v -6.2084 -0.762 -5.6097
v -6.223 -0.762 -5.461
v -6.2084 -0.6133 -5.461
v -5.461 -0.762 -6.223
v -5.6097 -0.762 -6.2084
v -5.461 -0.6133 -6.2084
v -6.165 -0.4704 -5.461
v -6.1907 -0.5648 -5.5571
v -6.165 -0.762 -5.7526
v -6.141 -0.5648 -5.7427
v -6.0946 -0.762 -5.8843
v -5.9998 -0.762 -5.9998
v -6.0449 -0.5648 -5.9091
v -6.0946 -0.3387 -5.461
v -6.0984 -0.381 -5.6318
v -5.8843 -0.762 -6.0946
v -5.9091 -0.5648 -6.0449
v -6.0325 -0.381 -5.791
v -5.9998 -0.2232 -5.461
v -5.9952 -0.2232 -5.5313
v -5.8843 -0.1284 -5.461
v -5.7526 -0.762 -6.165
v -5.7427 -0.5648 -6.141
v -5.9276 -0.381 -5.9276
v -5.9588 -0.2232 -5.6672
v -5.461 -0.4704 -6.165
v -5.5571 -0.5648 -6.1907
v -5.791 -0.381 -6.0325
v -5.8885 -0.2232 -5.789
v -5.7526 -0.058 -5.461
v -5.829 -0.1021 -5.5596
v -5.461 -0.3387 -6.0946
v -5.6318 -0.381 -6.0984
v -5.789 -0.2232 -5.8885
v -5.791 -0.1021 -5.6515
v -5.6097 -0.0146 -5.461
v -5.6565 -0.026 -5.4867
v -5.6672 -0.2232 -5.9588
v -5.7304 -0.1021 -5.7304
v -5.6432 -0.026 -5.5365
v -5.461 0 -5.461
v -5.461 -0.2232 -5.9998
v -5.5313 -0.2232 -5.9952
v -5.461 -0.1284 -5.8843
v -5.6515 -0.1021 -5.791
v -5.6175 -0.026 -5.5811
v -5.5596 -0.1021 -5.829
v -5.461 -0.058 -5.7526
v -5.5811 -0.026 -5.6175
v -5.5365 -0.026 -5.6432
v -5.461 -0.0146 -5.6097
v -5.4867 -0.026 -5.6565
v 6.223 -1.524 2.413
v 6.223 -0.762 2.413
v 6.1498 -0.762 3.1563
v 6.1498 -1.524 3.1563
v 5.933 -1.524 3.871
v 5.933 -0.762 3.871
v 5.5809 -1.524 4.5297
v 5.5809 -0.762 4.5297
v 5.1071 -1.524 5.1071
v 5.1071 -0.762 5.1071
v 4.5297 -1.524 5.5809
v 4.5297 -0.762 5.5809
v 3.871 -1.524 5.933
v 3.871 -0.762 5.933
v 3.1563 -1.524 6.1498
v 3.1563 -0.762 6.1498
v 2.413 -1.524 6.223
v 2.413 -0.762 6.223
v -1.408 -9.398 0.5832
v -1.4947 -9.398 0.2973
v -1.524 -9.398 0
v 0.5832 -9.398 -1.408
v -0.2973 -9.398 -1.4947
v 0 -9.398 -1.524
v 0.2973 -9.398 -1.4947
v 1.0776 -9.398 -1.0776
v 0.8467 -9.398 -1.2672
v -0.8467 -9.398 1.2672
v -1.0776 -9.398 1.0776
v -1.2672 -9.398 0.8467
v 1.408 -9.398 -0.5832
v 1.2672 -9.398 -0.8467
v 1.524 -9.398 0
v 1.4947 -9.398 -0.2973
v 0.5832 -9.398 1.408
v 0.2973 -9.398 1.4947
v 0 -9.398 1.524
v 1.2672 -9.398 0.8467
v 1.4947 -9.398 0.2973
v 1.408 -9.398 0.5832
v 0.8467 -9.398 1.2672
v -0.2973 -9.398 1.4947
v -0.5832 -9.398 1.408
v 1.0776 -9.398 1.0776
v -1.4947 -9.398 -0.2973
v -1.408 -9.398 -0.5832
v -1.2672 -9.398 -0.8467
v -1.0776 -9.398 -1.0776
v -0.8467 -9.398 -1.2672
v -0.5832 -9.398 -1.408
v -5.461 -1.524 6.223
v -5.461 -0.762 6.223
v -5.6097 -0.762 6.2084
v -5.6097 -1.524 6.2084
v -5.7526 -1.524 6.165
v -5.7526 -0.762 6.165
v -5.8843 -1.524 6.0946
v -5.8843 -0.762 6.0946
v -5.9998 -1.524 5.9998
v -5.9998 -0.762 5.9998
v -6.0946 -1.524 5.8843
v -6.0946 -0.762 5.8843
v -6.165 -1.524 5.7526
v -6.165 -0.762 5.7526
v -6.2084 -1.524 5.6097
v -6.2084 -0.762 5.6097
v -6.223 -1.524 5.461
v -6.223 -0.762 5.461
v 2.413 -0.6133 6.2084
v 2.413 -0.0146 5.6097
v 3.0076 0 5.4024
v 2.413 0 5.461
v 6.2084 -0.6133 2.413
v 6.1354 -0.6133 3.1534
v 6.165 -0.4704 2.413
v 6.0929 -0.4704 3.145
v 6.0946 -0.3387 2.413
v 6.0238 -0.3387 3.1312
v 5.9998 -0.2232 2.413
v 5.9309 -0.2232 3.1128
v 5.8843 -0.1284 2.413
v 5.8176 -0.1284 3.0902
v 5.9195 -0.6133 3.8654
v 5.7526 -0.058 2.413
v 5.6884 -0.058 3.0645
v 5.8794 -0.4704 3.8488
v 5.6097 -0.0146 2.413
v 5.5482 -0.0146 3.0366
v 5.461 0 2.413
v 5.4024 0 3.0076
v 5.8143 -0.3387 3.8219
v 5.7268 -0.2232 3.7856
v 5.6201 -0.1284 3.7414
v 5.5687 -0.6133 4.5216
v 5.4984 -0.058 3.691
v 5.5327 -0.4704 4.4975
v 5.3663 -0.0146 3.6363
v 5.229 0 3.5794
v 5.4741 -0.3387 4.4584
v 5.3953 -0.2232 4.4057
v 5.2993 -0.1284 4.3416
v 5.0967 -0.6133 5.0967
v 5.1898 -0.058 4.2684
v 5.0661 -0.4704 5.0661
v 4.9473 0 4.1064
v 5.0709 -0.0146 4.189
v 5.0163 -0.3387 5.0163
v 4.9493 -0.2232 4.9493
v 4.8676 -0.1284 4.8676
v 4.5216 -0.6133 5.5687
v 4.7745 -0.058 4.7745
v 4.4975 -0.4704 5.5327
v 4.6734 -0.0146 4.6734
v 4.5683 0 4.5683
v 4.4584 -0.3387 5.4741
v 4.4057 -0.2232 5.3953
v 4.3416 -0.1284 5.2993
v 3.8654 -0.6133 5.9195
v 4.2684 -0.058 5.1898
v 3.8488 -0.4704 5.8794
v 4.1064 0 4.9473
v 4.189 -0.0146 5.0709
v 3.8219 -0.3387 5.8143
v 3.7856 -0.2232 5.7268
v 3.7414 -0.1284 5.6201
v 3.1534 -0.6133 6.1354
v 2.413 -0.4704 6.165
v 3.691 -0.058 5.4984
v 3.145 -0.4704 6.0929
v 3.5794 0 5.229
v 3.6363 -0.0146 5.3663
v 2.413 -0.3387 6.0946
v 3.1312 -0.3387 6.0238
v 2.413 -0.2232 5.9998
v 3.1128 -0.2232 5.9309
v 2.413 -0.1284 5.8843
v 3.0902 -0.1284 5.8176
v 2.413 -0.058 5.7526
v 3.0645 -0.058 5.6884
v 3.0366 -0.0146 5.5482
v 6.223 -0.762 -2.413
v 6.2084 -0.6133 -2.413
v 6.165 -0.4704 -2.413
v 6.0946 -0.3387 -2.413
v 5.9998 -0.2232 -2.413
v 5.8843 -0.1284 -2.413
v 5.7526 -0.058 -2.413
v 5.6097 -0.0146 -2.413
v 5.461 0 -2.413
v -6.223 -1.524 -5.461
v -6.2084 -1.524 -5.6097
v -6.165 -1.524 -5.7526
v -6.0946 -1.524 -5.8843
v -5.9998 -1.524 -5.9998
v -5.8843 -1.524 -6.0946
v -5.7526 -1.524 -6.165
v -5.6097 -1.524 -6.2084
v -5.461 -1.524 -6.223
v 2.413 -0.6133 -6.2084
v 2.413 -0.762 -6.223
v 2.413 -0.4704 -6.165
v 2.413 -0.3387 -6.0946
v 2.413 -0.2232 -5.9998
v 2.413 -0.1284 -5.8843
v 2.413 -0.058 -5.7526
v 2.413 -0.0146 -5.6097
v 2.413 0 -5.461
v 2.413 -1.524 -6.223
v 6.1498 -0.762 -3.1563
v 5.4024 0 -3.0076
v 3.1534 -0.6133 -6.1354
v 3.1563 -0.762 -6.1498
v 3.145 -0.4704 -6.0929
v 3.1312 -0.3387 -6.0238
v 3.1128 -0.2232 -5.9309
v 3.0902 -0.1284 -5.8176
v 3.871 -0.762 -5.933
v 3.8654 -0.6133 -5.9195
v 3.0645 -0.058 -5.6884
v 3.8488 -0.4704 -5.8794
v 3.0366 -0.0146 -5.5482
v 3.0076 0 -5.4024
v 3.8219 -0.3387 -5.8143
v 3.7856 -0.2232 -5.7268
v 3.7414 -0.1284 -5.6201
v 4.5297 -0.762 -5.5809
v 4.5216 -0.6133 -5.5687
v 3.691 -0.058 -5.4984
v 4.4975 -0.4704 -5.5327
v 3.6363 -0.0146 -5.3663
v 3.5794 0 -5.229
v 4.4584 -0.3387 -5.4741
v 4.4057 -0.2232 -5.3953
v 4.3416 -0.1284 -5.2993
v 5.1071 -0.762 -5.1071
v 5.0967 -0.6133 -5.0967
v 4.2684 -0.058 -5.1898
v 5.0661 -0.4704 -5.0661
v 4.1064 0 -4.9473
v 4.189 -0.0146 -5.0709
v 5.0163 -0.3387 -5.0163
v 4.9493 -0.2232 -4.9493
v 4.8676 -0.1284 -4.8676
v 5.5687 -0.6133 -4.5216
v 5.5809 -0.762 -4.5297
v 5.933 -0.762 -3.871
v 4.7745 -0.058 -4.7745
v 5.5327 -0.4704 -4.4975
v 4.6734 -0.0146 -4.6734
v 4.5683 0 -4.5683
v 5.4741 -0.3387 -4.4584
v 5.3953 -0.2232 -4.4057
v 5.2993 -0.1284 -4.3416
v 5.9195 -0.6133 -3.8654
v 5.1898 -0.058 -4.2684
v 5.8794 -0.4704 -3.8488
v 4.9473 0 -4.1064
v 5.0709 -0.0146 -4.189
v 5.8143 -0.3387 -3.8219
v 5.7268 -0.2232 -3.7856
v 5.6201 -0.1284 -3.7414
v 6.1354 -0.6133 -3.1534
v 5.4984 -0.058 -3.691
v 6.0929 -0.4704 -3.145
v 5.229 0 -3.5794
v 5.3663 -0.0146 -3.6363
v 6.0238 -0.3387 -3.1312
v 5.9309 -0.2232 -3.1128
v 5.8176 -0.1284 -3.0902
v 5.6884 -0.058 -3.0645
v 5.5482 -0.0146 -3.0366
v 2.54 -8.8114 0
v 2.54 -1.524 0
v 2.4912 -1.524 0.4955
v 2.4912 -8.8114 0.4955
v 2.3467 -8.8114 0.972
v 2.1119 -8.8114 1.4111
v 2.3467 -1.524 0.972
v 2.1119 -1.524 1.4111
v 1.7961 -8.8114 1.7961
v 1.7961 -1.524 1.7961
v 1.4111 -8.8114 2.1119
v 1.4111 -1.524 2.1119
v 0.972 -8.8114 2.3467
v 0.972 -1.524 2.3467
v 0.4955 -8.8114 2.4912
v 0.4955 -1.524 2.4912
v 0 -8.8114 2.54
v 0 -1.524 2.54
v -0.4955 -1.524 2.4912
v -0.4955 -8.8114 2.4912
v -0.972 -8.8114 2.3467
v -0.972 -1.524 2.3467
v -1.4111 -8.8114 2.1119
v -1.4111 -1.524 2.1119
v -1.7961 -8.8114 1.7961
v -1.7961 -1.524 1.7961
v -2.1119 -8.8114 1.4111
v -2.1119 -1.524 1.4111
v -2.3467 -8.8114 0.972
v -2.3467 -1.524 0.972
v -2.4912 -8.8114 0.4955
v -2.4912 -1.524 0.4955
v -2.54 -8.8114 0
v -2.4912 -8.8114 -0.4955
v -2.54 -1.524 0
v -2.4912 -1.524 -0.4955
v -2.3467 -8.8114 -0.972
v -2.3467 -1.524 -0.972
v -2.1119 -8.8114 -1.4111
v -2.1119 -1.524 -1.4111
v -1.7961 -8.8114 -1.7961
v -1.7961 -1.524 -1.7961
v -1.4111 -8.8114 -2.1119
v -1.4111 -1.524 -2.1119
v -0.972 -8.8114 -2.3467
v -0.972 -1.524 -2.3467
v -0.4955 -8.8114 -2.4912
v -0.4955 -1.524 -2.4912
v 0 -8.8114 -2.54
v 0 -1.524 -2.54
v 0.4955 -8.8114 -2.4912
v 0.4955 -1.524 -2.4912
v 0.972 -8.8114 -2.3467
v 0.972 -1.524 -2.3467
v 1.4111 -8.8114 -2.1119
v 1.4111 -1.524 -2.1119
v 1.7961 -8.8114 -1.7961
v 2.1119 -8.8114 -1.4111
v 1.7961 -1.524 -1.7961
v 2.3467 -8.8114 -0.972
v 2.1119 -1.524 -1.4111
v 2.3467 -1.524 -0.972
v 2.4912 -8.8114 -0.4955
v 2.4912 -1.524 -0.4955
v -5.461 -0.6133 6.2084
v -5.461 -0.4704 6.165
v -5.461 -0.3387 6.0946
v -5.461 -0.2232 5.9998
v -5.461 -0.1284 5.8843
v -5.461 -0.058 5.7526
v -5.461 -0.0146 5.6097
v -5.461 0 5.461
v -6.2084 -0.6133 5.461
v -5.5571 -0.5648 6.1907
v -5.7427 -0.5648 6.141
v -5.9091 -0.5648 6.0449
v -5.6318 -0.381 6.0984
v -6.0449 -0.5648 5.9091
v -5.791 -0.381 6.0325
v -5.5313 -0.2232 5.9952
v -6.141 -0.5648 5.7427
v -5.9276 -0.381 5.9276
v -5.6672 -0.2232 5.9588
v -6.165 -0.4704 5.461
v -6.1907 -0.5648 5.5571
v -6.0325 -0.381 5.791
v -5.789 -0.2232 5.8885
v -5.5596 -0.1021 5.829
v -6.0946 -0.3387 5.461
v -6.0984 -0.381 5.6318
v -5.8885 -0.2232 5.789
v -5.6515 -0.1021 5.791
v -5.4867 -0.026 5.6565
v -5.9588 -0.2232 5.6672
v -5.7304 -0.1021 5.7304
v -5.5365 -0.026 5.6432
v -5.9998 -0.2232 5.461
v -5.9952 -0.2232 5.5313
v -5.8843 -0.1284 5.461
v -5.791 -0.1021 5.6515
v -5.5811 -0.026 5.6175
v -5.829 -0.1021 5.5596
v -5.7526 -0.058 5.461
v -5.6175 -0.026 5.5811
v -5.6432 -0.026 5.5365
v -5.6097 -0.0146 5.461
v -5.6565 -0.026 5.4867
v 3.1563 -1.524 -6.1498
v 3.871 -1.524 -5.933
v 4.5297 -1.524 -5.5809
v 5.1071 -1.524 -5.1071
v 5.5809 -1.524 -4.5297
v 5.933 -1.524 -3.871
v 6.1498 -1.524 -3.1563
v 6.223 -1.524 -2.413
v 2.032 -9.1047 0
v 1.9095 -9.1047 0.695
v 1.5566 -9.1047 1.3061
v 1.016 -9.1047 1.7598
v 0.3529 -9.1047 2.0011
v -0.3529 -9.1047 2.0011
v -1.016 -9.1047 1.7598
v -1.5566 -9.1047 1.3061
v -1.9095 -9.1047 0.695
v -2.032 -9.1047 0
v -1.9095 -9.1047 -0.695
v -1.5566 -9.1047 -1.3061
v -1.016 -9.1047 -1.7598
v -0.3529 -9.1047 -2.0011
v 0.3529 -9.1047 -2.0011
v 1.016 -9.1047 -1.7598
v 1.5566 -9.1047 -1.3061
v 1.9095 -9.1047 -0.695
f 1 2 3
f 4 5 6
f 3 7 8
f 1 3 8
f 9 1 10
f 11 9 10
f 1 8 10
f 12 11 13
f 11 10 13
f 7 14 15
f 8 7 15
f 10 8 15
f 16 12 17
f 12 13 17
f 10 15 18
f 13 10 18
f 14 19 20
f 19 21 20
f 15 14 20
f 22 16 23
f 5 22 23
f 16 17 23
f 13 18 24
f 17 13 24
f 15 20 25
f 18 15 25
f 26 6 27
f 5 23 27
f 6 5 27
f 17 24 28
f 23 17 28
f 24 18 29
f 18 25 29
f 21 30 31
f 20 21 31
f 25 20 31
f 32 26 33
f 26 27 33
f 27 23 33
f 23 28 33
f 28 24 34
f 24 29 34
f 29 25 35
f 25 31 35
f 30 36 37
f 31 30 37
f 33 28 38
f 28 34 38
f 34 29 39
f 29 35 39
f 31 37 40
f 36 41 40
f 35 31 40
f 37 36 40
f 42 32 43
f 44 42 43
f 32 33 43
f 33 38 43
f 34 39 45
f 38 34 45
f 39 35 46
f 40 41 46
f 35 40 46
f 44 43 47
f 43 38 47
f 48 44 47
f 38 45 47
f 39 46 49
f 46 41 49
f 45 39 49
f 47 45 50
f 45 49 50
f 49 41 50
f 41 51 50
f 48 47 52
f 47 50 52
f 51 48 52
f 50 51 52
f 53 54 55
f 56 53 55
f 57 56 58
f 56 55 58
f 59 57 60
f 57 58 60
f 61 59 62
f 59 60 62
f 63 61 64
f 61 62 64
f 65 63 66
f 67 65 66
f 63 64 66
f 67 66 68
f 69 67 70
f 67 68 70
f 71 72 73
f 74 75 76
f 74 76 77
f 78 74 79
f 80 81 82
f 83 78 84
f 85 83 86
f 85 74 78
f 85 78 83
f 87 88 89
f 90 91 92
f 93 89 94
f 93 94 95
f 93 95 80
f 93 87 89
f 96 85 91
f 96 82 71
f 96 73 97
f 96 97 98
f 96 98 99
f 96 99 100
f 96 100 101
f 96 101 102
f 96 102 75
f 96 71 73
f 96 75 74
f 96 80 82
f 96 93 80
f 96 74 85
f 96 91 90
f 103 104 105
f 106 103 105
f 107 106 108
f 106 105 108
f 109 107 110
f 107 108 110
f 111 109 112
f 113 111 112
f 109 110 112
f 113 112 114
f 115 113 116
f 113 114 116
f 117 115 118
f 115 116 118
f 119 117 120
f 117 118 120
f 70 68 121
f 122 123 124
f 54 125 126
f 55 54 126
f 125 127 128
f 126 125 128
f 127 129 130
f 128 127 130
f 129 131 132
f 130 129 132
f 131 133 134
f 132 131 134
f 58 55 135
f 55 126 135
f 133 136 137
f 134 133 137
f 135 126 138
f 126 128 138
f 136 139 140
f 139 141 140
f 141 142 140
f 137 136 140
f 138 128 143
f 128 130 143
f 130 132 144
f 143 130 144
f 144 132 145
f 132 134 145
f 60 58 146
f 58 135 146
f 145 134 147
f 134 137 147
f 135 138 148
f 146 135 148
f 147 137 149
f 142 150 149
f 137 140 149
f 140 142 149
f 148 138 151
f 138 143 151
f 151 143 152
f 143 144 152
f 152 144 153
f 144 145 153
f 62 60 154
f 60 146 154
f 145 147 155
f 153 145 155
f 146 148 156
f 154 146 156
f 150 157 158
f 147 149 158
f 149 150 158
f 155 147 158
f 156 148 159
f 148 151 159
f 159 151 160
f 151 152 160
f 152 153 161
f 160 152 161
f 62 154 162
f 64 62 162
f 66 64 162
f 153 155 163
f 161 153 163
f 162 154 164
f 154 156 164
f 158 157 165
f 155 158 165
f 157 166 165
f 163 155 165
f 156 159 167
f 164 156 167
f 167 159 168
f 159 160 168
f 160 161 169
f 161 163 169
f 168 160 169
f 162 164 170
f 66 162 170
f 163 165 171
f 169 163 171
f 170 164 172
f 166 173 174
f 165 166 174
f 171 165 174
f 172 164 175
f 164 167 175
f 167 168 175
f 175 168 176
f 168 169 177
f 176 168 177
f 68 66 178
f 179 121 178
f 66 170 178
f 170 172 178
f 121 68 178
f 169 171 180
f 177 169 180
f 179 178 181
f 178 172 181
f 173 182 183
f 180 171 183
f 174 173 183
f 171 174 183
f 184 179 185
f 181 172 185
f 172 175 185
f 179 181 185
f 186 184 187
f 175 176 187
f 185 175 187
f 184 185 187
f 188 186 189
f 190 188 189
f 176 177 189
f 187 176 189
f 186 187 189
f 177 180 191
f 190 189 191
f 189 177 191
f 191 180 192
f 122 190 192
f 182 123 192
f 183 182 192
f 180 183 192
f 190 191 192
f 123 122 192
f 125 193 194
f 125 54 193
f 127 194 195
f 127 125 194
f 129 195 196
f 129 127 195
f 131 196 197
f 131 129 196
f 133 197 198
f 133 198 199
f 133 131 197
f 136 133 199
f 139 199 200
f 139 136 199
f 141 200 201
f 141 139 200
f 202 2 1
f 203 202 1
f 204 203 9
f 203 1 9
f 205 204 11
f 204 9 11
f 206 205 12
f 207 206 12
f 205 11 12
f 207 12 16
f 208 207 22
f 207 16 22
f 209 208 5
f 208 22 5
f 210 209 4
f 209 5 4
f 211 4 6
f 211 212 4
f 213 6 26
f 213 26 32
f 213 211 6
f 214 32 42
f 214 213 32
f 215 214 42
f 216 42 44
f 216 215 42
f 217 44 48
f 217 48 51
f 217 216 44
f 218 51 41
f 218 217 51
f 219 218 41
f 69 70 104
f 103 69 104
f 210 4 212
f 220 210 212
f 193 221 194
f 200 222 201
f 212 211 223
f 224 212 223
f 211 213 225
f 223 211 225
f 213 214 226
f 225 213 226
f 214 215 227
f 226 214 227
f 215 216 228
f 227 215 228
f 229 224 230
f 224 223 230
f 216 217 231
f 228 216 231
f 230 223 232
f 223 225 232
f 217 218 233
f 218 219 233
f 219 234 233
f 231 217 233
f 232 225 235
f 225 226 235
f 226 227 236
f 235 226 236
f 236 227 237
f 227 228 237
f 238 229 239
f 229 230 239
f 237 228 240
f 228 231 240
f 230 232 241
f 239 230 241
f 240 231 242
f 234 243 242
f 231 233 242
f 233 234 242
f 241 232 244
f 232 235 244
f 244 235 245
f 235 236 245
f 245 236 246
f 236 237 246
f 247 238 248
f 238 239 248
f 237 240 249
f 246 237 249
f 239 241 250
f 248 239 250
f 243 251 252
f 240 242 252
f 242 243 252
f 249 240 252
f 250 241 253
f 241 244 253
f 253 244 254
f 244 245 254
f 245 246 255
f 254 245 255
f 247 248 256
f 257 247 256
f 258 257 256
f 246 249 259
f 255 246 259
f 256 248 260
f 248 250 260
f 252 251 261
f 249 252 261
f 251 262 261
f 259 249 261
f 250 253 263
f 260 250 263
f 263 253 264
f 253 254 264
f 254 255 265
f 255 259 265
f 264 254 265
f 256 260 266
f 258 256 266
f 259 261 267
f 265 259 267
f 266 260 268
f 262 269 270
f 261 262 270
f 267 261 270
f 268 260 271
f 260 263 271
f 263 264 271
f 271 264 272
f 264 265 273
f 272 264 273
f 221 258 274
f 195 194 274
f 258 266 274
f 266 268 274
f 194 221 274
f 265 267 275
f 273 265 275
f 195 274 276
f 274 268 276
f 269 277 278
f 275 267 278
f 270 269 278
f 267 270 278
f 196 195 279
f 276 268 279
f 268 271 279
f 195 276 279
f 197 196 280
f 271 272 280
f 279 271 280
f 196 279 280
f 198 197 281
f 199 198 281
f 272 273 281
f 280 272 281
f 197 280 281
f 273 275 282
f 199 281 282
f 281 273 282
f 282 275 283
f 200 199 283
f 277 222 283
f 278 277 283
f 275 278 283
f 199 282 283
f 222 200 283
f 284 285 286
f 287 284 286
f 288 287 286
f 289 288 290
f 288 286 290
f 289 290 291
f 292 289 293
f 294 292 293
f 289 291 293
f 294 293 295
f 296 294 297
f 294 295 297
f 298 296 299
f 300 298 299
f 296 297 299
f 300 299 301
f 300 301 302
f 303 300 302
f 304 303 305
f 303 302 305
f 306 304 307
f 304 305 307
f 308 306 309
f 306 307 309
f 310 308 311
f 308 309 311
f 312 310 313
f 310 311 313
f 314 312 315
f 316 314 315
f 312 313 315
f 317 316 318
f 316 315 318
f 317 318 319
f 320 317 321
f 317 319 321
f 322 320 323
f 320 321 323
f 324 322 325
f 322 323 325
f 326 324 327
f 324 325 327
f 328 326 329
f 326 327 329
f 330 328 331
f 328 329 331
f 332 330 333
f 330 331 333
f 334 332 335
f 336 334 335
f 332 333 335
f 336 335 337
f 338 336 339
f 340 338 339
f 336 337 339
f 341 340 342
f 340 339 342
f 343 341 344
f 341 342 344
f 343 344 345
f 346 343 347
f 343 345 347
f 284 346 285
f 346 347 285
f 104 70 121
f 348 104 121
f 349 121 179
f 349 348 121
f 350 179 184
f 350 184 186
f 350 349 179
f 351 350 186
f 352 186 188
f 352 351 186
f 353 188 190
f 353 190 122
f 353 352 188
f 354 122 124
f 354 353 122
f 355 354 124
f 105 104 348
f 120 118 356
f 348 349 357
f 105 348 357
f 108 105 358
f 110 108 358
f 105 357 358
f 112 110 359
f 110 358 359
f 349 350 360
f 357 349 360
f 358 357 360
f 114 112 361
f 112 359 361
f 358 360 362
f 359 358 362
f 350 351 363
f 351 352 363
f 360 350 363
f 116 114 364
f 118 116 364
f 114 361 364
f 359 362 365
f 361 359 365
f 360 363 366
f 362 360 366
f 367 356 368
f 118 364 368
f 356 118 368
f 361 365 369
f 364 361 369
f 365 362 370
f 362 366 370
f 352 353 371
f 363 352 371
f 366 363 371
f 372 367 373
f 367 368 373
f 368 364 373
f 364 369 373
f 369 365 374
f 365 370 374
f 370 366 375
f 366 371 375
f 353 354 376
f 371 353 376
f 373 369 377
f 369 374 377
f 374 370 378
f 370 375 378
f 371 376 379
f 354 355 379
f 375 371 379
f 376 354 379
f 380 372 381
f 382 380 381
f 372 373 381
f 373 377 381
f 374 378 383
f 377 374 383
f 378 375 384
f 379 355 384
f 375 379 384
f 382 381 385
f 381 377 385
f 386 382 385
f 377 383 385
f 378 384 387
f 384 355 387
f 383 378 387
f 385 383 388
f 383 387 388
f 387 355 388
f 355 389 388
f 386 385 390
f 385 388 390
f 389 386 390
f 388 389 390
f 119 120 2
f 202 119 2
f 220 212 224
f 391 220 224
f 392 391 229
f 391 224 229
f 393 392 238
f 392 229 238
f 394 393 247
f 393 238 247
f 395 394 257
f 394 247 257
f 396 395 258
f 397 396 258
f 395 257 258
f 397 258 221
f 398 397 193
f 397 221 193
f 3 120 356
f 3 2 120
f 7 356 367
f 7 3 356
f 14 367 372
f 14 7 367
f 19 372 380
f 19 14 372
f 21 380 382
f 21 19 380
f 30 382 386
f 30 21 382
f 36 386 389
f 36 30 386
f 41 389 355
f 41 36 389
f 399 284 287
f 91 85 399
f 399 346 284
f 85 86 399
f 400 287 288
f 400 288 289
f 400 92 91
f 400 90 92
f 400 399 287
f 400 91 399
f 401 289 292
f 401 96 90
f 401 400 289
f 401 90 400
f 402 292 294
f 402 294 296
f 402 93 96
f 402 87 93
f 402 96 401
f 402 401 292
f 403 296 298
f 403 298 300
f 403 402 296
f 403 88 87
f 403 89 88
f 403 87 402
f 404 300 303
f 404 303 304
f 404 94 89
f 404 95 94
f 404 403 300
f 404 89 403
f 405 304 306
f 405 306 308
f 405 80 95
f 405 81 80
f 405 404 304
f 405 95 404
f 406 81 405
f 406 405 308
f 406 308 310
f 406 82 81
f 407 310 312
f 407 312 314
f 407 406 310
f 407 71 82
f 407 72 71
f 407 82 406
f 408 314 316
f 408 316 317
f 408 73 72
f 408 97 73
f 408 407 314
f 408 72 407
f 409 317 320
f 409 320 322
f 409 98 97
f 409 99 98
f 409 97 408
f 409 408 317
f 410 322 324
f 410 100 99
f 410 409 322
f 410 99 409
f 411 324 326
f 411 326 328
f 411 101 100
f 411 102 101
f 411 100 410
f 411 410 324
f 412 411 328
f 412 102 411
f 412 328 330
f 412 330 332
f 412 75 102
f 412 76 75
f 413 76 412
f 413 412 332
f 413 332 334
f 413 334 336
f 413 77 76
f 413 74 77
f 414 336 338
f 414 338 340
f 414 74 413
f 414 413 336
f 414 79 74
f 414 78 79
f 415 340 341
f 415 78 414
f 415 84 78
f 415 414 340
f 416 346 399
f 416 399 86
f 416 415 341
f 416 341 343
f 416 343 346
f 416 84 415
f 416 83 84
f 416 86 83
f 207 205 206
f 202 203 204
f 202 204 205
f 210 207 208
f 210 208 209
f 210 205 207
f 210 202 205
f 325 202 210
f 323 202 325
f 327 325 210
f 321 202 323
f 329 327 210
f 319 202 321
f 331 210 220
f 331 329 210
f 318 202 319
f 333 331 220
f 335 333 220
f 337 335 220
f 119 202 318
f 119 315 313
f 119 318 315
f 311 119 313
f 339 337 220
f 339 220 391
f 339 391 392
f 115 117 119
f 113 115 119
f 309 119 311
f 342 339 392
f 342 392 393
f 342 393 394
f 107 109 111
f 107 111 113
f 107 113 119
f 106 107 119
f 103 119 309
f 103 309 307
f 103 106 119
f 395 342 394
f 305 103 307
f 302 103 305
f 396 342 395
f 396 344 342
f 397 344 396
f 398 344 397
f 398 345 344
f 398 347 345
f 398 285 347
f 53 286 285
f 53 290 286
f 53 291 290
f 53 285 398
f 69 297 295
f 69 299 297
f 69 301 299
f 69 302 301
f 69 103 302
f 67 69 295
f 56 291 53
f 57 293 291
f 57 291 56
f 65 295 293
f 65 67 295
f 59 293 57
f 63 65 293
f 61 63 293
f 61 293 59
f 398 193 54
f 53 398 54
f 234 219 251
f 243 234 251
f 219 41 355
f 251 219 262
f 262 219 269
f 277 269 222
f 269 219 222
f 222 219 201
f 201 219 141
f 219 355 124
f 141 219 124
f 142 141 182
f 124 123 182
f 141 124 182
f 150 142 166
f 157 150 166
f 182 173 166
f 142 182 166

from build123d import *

# Parameters (mm, degrees)
F1_DEPTH = 1.524
F2_R     = 0.762
F3_R     = 2.54
F4_DEPTH = 7.874
F5_SIZE2 = 1.016
F5_SIZE  = 0.5865878735


with BuildPart() as f1:
    # F0 (on Front) → F1 (new body)
    with BuildSketch(Plane.XZ):
        with BuildLine():
            ThreePointArc((6.223, 2.413), (5.1070768363, 5.1070768363), (2.413, 6.223))
            Line((2.413, 6.223), (-5.461, 6.223))
            ThreePointArc((-5.461, 6.223), (-5.9998153673, 5.9998153673), (-6.223, 5.461))
            Line((-6.223, 5.461), (-6.223, -5.461))
            ThreePointArc((-6.223, -5.461), (-5.9998153673, -5.9998153673), (-5.461, -6.223))
            Line((-5.461, -6.223), (2.413, -6.223))
            ThreePointArc((2.413, -6.223), (5.1070768363, -5.1070768363), (6.223, -2.413))
            Line((6.223, -2.413), (6.223, 2.413))
        make_face()
    extrude(amount=F1_DEPTH)

    # F2
    f2_edges = [f1.edges().sort_by_distance(p)[0] for p in [
        (-1.524, 0, -6.223),
    ]]
    fillet(f2_edges, radius=F2_R)

    # F3 (on face) → F4 (join)
    with BuildSketch(Plane.XZ.offset(1.524)):
        Circle(F3_R)
    extrude(amount=F4_DEPTH)

    # F5
    f5_edges = [f1.edges().sort_by_distance(p)[0] for p in [
        (-2.54, -9.398, 0),
    ]]
    f5_side = f1.faces().sort_by_distance((-2.54, -5.461, 0))[0]
    chamfer(f5_edges, length=F5_SIZE, length2=F5_SIZE2, reference=f5_side)


solid = f1.part
